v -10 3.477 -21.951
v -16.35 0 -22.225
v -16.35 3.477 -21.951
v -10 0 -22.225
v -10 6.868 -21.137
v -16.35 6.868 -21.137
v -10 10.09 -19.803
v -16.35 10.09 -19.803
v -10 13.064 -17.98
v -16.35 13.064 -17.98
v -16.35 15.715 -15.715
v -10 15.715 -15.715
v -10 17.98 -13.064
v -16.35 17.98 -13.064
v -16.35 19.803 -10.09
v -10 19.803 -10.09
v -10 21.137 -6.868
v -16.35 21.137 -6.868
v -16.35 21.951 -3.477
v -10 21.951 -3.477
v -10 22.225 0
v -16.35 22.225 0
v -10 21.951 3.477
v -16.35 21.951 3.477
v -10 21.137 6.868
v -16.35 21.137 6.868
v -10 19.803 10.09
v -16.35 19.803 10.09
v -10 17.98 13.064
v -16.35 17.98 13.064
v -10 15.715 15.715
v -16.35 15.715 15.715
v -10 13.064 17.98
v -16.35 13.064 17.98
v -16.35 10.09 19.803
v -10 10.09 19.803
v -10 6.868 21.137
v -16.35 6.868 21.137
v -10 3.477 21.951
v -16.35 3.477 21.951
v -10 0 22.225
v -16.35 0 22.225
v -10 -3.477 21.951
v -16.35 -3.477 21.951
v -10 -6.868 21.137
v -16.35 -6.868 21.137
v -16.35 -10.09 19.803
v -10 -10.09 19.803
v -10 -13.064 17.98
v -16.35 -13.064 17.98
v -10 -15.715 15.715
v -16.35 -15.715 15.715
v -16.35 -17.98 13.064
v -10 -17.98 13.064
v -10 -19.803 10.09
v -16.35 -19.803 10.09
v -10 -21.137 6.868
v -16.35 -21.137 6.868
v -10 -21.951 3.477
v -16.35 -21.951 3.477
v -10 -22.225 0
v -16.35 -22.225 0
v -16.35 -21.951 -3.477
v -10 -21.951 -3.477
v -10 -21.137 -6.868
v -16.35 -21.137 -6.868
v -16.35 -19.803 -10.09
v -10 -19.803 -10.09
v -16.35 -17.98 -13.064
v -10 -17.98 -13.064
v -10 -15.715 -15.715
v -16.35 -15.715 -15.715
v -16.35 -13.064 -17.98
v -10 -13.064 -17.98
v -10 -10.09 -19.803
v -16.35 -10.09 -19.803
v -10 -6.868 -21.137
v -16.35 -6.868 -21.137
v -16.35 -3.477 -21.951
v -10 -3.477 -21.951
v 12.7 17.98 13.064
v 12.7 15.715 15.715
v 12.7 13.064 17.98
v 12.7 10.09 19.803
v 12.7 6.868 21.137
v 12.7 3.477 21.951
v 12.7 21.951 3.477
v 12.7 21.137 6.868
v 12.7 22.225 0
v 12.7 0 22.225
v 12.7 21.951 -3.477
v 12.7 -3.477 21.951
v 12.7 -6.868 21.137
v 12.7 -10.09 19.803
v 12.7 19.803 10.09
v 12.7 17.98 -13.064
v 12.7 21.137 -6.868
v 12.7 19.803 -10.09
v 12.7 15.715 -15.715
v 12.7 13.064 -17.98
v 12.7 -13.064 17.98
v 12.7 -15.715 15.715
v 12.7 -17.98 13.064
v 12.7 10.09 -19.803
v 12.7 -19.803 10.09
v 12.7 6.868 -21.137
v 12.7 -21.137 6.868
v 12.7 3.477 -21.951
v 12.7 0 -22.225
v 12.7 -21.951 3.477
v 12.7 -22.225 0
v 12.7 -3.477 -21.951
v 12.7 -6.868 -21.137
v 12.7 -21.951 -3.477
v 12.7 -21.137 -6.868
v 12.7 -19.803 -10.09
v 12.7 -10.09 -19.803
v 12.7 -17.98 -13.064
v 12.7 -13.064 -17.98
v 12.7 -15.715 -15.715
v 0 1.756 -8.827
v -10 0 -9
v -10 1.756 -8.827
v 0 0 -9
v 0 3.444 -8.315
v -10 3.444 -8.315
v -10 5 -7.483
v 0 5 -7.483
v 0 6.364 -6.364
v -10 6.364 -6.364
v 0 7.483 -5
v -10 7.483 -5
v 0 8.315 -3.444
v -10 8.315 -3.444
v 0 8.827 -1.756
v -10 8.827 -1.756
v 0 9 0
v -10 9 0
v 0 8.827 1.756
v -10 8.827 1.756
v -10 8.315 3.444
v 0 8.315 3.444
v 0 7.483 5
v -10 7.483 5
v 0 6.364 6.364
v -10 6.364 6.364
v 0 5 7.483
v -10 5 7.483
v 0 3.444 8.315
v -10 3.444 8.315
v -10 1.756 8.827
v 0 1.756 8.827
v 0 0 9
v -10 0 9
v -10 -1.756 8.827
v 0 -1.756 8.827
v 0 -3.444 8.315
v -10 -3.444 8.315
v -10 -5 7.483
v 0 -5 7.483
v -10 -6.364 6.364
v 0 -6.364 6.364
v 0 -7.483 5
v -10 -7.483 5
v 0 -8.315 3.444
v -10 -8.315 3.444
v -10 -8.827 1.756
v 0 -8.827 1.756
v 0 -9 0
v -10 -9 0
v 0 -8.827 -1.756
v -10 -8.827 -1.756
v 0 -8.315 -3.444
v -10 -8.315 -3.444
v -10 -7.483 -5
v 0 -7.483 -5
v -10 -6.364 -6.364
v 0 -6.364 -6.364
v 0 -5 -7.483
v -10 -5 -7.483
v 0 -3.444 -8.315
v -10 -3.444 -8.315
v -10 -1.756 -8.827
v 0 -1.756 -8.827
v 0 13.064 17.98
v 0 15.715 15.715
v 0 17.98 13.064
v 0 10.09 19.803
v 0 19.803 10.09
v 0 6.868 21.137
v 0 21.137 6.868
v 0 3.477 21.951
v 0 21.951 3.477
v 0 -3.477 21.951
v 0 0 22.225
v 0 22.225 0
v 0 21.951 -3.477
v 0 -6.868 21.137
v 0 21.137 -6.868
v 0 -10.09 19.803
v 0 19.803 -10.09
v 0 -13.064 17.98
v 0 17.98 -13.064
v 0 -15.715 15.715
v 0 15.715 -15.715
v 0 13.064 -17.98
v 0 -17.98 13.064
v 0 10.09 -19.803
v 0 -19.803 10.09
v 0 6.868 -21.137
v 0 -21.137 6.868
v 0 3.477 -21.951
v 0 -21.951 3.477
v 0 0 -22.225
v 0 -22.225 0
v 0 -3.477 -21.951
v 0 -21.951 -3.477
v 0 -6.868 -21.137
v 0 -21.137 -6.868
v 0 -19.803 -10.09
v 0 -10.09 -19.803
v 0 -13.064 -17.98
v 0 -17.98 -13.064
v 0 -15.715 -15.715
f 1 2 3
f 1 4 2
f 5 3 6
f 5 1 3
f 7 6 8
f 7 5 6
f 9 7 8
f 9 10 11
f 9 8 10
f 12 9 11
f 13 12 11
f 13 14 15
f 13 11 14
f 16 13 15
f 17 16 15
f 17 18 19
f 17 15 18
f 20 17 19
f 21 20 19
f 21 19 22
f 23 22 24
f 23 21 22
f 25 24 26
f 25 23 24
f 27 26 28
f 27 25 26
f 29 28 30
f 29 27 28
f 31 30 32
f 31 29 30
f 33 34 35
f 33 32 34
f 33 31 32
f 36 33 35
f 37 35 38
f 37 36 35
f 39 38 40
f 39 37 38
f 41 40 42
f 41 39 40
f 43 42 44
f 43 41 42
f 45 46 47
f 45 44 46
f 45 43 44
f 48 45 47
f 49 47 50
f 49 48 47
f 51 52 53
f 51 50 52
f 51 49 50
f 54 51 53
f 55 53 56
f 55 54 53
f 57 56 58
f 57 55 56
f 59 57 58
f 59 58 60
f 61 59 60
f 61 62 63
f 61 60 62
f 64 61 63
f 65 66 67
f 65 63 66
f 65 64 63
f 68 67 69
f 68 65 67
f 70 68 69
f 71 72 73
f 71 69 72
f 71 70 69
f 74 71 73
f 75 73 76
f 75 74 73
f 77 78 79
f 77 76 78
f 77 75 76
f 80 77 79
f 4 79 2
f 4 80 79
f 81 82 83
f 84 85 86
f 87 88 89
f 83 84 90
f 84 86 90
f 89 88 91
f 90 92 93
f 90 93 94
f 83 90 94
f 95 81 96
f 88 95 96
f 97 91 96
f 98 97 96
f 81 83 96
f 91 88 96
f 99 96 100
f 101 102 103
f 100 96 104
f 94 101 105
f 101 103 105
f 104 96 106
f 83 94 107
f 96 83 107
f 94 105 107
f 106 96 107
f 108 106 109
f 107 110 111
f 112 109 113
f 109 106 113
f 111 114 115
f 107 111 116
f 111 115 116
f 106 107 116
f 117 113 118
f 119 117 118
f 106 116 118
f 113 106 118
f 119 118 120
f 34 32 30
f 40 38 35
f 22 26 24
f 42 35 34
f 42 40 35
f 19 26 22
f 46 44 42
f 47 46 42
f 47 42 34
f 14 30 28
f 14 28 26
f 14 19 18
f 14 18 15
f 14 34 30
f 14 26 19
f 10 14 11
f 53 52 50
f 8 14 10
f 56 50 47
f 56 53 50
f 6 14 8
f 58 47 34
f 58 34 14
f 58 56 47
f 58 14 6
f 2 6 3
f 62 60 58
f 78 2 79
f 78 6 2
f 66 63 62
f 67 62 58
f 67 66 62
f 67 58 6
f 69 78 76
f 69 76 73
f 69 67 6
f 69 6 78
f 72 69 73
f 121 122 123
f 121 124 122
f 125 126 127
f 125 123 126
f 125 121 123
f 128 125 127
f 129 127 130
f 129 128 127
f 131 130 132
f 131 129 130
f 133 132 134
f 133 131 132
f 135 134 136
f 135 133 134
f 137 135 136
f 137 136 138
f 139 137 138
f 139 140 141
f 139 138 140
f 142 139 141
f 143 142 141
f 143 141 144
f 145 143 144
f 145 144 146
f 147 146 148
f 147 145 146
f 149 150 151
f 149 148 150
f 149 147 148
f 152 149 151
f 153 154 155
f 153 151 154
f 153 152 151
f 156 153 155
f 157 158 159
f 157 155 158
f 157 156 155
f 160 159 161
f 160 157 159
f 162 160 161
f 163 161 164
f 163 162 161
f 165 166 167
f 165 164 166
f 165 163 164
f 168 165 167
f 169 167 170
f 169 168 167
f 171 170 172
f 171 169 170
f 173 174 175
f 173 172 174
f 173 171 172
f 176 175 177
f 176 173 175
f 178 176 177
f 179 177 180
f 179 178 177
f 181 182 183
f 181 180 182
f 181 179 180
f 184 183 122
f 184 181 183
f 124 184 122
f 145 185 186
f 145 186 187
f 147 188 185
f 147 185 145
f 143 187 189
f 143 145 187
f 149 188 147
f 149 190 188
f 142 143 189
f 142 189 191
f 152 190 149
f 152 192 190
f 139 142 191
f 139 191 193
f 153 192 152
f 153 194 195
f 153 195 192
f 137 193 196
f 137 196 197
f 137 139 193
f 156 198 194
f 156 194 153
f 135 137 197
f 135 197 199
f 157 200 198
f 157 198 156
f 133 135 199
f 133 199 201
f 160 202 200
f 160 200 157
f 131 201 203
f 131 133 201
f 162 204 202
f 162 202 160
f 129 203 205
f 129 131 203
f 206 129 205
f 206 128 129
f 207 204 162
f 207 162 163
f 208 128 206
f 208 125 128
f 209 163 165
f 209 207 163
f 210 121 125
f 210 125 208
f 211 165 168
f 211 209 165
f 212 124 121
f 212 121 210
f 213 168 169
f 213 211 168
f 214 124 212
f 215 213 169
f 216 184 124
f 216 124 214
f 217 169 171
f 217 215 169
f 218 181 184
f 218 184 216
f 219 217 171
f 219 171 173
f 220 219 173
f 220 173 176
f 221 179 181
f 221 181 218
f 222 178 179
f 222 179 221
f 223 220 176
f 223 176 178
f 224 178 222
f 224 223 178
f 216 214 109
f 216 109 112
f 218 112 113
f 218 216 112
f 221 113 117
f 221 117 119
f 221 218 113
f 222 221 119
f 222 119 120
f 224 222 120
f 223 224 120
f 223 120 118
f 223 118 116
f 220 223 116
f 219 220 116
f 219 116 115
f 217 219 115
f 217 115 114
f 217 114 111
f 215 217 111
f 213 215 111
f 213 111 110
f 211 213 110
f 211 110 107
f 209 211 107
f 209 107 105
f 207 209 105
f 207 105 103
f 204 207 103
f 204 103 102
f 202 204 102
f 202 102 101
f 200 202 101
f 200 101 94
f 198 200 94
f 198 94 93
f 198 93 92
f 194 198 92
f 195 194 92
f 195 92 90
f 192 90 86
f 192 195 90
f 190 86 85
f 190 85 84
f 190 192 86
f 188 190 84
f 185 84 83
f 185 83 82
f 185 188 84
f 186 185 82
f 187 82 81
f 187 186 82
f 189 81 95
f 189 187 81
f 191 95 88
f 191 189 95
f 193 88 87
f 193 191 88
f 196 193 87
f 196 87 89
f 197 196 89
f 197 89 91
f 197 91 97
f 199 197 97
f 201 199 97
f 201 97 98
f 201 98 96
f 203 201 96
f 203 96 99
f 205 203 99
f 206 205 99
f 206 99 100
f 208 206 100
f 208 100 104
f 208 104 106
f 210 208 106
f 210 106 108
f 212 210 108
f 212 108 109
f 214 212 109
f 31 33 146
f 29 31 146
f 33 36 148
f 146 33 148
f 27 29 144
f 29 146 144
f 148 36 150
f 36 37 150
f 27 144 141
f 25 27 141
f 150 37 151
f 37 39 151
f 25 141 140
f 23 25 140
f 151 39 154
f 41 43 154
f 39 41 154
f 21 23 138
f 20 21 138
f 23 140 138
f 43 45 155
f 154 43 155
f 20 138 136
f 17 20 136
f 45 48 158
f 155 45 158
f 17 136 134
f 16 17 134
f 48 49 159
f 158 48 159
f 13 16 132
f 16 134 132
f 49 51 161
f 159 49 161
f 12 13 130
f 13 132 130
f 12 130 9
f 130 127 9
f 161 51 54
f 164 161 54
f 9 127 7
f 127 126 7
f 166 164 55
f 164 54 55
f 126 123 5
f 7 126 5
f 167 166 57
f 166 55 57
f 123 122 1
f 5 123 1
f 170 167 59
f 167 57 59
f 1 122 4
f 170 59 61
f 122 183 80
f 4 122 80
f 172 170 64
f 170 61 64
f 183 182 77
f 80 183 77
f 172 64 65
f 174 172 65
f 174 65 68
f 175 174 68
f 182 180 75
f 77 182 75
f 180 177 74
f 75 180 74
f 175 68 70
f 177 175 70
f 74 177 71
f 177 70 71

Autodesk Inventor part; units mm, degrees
ref_plane "YZ Plane" through (0, 0, 0) normal (1, 0, 0) x (0, 1, 0)
ref_plane "XZ Plane" through (0, 0, 0) normal (0, 1, 0) x (-1, 0, 0)
ref_plane "XY Plane" through (0, 0, 0) normal (0, 0, 1) x (1, 0, 0)
sketch "Sketch1" plane through (0, 0, 0) normal (0, 1, 0) x (-1, 0, 0)
  line L0 (0, 0) -> (10, 0)
  line L1 (10, 0) -> (10, -9)
  line L2 (10, -9) -> (0, -9)
  line L3 (0, -9) -> (0, 0)
  line L4 (10, 0) -> (16.35, 0)
  line L5 (16.35, 0) -> (16.35, -22.225)
  line L6 (16.35, -22.225) -> (10, -22.225)
  line L7 (10, -22.225) -> (10, 0)
  line L8 (0, 0) -> (-12.7, 0)
  line L9 (-12.7, 0) -> (-12.7, -22.225)
  line L10 (-12.7, -22.225) -> (0, -22.225)
  line L11 (0, -22.225) -> (0, 0)
  point P0 (0, -9)
  point P1 (10, -9)
  dimension "d0" = 10
  dimension "d1" = 9
  dimension "d2" = 6.35
  dimension "d3" = 22.225
  dimension "d4" = 22.225
  dimension "d5" = 12.7
revolve "Revolution1" add sketch "Sketch1" angle 360 about axis through (0, 0, 0) along (-1, 0, 0)
equation "\"d4\" = d3"
properties part number "Temp Sprocket" material "Nylon 6/6"
